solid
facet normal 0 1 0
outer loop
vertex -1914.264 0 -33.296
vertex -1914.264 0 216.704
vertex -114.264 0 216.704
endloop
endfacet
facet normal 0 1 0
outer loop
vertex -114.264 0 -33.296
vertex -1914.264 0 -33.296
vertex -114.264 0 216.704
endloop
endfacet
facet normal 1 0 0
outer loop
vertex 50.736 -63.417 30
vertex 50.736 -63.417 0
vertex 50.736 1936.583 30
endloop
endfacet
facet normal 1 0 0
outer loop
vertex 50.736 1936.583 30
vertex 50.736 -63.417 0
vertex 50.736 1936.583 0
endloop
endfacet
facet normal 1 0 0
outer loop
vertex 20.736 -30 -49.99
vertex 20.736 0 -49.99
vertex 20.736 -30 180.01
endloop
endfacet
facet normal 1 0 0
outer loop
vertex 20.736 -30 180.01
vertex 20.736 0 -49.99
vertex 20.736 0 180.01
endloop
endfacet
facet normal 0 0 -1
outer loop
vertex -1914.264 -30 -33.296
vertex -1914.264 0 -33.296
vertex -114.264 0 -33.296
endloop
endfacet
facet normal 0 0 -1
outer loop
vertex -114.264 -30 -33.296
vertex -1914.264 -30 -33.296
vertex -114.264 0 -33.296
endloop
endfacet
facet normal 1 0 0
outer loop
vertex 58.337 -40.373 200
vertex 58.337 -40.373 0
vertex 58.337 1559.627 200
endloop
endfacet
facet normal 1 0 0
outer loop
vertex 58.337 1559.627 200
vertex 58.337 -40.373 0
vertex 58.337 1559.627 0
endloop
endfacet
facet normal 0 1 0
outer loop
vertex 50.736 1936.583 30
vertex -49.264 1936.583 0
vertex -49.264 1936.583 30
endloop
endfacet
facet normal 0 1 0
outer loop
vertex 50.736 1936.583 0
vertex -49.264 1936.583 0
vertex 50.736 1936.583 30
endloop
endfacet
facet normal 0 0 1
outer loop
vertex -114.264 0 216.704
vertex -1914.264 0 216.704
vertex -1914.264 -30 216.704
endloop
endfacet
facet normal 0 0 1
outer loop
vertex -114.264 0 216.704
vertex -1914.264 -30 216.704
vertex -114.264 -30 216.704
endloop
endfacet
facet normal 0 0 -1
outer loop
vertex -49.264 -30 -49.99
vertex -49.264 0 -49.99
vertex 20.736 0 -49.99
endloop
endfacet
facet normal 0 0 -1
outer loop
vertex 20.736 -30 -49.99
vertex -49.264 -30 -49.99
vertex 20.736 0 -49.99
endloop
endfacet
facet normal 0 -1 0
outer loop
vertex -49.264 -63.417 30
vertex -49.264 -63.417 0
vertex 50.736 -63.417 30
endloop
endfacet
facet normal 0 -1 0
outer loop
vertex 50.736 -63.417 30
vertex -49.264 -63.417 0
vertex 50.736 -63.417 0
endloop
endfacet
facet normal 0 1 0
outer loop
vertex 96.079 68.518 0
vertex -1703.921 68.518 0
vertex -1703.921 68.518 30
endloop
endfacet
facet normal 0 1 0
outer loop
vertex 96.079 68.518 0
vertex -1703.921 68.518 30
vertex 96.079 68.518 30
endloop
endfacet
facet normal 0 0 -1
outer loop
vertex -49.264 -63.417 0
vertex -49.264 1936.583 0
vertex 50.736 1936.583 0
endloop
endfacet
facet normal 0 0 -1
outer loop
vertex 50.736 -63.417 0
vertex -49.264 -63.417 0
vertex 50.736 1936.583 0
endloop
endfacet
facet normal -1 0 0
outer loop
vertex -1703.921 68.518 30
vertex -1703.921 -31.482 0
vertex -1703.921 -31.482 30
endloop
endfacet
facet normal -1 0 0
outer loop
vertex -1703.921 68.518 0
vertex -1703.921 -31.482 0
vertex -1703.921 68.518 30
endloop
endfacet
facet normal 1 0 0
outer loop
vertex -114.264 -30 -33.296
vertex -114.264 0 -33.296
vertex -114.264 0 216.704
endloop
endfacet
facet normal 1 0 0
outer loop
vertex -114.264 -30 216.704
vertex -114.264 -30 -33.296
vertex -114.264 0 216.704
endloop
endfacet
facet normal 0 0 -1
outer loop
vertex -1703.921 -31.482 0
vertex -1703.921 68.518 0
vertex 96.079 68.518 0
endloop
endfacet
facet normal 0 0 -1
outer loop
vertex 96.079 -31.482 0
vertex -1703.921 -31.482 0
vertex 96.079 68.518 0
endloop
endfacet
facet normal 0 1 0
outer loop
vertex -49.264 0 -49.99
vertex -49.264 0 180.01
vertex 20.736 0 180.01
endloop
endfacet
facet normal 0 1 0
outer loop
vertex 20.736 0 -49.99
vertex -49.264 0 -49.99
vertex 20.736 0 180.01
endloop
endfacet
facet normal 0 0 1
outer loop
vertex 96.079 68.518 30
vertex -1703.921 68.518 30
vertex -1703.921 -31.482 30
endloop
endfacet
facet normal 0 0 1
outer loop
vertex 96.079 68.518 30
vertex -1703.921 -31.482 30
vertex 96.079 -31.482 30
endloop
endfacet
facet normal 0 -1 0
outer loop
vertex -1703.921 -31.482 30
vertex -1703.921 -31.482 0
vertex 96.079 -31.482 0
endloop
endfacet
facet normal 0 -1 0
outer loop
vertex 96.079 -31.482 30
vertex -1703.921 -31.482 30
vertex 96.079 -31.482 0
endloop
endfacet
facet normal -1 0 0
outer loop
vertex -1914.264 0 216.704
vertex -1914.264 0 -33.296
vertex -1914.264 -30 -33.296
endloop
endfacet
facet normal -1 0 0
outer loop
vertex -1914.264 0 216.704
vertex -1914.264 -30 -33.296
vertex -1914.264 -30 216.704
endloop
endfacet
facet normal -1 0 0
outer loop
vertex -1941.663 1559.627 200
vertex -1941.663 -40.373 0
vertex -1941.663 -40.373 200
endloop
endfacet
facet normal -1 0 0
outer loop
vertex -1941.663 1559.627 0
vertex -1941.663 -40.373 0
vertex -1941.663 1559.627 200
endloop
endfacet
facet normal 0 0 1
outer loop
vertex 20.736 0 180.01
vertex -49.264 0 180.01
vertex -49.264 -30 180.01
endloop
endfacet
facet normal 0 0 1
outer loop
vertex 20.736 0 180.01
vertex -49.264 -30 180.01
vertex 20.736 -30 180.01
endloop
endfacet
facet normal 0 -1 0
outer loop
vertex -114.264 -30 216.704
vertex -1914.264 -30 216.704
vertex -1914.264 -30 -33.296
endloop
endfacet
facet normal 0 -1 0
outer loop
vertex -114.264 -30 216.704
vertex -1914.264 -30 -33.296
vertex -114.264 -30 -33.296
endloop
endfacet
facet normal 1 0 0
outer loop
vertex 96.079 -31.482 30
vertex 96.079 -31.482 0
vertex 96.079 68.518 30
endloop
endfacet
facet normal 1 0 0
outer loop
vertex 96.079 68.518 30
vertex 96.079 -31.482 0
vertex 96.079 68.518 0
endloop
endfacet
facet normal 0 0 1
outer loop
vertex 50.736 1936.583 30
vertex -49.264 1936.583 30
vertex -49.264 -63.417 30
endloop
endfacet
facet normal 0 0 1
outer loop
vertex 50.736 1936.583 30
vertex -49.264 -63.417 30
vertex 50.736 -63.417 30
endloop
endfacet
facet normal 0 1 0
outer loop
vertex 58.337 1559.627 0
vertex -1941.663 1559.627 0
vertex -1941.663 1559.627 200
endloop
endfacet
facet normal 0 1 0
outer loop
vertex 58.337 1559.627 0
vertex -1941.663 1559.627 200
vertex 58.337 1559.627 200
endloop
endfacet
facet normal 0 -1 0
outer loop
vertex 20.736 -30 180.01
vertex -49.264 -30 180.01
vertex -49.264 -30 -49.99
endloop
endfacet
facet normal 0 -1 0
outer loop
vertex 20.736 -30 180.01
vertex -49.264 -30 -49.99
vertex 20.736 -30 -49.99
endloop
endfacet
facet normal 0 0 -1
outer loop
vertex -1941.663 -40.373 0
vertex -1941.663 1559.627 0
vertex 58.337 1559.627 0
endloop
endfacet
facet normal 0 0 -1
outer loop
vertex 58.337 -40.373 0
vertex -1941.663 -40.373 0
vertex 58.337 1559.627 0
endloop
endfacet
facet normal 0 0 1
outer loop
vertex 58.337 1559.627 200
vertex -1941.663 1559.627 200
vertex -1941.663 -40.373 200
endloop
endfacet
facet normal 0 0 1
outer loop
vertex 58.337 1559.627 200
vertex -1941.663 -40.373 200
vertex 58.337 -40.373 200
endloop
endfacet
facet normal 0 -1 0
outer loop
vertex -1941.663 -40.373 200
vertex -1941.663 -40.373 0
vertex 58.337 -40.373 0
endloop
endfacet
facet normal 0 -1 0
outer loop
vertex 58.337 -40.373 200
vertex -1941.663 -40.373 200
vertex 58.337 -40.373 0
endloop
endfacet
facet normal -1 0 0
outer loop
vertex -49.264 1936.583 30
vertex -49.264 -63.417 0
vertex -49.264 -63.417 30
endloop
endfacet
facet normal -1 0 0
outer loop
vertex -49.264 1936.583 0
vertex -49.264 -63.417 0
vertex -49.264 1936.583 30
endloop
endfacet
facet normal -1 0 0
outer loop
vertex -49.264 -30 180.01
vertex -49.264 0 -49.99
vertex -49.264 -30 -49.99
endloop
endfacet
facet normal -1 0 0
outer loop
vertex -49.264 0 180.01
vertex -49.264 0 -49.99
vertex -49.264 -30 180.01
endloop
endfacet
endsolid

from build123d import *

# Parameters (mm, degrees)
F0_W     = 1800
F0_H     = 250
F1_DEPTH = 30
F2_W     = 100
F2_H     = 2000
F3_DEPTH = 30
F4_W     = 70
F4_H     = 230
F5_DEPTH = 30
F6_W     = 2000
F6_H     = 1600
F7_DEPTH = 200
F8_W     = 1800
F8_H     = 100
F9_DEPTH = 30


with BuildPart() as f1:
    # F0 (on Front) → F1 (new body)
    with BuildSketch(Plane.XZ):
        with Locations((-1014.264105, 91.703627)):
            Rectangle(F0_W, F0_H)
    extrude(amount=F1_DEPTH)


with BuildPart() as f3:
    # F2 (on Top) → F3 (new body)
    with BuildSketch(Plane.XY):
        with Locations((0.735886, 936.582662)):
            Rectangle(F2_W, F2_H)
    extrude(amount=F3_DEPTH)


with BuildPart() as f5:
    # F4 (on Front) → F5 (new body)
    with BuildSketch(Plane.XZ):
        with Locations((-14.264114, 65.01008)):
            Rectangle(F4_W, F4_H)
    extrude(amount=F5_DEPTH)


with BuildPart() as f7:
    # F6 (on Top) → F7 (new body)
    with BuildSketch(Plane.XY):
        with Locations((-941.663302, 759.627017)):
            Rectangle(F6_W, F6_H)
    extrude(amount=F7_DEPTH)


with BuildPart() as f9:
    # F8 (on Top) → F9 (new body)
    with BuildSketch(Plane.XY):
        with Locations((-803.921366, 18.518145)):
            Rectangle(F8_W, F8_H)
    extrude(amount=F9_DEPTH)


solid = Compound([f1.part, f3.part, f5.part, f7.part, f9.part])
